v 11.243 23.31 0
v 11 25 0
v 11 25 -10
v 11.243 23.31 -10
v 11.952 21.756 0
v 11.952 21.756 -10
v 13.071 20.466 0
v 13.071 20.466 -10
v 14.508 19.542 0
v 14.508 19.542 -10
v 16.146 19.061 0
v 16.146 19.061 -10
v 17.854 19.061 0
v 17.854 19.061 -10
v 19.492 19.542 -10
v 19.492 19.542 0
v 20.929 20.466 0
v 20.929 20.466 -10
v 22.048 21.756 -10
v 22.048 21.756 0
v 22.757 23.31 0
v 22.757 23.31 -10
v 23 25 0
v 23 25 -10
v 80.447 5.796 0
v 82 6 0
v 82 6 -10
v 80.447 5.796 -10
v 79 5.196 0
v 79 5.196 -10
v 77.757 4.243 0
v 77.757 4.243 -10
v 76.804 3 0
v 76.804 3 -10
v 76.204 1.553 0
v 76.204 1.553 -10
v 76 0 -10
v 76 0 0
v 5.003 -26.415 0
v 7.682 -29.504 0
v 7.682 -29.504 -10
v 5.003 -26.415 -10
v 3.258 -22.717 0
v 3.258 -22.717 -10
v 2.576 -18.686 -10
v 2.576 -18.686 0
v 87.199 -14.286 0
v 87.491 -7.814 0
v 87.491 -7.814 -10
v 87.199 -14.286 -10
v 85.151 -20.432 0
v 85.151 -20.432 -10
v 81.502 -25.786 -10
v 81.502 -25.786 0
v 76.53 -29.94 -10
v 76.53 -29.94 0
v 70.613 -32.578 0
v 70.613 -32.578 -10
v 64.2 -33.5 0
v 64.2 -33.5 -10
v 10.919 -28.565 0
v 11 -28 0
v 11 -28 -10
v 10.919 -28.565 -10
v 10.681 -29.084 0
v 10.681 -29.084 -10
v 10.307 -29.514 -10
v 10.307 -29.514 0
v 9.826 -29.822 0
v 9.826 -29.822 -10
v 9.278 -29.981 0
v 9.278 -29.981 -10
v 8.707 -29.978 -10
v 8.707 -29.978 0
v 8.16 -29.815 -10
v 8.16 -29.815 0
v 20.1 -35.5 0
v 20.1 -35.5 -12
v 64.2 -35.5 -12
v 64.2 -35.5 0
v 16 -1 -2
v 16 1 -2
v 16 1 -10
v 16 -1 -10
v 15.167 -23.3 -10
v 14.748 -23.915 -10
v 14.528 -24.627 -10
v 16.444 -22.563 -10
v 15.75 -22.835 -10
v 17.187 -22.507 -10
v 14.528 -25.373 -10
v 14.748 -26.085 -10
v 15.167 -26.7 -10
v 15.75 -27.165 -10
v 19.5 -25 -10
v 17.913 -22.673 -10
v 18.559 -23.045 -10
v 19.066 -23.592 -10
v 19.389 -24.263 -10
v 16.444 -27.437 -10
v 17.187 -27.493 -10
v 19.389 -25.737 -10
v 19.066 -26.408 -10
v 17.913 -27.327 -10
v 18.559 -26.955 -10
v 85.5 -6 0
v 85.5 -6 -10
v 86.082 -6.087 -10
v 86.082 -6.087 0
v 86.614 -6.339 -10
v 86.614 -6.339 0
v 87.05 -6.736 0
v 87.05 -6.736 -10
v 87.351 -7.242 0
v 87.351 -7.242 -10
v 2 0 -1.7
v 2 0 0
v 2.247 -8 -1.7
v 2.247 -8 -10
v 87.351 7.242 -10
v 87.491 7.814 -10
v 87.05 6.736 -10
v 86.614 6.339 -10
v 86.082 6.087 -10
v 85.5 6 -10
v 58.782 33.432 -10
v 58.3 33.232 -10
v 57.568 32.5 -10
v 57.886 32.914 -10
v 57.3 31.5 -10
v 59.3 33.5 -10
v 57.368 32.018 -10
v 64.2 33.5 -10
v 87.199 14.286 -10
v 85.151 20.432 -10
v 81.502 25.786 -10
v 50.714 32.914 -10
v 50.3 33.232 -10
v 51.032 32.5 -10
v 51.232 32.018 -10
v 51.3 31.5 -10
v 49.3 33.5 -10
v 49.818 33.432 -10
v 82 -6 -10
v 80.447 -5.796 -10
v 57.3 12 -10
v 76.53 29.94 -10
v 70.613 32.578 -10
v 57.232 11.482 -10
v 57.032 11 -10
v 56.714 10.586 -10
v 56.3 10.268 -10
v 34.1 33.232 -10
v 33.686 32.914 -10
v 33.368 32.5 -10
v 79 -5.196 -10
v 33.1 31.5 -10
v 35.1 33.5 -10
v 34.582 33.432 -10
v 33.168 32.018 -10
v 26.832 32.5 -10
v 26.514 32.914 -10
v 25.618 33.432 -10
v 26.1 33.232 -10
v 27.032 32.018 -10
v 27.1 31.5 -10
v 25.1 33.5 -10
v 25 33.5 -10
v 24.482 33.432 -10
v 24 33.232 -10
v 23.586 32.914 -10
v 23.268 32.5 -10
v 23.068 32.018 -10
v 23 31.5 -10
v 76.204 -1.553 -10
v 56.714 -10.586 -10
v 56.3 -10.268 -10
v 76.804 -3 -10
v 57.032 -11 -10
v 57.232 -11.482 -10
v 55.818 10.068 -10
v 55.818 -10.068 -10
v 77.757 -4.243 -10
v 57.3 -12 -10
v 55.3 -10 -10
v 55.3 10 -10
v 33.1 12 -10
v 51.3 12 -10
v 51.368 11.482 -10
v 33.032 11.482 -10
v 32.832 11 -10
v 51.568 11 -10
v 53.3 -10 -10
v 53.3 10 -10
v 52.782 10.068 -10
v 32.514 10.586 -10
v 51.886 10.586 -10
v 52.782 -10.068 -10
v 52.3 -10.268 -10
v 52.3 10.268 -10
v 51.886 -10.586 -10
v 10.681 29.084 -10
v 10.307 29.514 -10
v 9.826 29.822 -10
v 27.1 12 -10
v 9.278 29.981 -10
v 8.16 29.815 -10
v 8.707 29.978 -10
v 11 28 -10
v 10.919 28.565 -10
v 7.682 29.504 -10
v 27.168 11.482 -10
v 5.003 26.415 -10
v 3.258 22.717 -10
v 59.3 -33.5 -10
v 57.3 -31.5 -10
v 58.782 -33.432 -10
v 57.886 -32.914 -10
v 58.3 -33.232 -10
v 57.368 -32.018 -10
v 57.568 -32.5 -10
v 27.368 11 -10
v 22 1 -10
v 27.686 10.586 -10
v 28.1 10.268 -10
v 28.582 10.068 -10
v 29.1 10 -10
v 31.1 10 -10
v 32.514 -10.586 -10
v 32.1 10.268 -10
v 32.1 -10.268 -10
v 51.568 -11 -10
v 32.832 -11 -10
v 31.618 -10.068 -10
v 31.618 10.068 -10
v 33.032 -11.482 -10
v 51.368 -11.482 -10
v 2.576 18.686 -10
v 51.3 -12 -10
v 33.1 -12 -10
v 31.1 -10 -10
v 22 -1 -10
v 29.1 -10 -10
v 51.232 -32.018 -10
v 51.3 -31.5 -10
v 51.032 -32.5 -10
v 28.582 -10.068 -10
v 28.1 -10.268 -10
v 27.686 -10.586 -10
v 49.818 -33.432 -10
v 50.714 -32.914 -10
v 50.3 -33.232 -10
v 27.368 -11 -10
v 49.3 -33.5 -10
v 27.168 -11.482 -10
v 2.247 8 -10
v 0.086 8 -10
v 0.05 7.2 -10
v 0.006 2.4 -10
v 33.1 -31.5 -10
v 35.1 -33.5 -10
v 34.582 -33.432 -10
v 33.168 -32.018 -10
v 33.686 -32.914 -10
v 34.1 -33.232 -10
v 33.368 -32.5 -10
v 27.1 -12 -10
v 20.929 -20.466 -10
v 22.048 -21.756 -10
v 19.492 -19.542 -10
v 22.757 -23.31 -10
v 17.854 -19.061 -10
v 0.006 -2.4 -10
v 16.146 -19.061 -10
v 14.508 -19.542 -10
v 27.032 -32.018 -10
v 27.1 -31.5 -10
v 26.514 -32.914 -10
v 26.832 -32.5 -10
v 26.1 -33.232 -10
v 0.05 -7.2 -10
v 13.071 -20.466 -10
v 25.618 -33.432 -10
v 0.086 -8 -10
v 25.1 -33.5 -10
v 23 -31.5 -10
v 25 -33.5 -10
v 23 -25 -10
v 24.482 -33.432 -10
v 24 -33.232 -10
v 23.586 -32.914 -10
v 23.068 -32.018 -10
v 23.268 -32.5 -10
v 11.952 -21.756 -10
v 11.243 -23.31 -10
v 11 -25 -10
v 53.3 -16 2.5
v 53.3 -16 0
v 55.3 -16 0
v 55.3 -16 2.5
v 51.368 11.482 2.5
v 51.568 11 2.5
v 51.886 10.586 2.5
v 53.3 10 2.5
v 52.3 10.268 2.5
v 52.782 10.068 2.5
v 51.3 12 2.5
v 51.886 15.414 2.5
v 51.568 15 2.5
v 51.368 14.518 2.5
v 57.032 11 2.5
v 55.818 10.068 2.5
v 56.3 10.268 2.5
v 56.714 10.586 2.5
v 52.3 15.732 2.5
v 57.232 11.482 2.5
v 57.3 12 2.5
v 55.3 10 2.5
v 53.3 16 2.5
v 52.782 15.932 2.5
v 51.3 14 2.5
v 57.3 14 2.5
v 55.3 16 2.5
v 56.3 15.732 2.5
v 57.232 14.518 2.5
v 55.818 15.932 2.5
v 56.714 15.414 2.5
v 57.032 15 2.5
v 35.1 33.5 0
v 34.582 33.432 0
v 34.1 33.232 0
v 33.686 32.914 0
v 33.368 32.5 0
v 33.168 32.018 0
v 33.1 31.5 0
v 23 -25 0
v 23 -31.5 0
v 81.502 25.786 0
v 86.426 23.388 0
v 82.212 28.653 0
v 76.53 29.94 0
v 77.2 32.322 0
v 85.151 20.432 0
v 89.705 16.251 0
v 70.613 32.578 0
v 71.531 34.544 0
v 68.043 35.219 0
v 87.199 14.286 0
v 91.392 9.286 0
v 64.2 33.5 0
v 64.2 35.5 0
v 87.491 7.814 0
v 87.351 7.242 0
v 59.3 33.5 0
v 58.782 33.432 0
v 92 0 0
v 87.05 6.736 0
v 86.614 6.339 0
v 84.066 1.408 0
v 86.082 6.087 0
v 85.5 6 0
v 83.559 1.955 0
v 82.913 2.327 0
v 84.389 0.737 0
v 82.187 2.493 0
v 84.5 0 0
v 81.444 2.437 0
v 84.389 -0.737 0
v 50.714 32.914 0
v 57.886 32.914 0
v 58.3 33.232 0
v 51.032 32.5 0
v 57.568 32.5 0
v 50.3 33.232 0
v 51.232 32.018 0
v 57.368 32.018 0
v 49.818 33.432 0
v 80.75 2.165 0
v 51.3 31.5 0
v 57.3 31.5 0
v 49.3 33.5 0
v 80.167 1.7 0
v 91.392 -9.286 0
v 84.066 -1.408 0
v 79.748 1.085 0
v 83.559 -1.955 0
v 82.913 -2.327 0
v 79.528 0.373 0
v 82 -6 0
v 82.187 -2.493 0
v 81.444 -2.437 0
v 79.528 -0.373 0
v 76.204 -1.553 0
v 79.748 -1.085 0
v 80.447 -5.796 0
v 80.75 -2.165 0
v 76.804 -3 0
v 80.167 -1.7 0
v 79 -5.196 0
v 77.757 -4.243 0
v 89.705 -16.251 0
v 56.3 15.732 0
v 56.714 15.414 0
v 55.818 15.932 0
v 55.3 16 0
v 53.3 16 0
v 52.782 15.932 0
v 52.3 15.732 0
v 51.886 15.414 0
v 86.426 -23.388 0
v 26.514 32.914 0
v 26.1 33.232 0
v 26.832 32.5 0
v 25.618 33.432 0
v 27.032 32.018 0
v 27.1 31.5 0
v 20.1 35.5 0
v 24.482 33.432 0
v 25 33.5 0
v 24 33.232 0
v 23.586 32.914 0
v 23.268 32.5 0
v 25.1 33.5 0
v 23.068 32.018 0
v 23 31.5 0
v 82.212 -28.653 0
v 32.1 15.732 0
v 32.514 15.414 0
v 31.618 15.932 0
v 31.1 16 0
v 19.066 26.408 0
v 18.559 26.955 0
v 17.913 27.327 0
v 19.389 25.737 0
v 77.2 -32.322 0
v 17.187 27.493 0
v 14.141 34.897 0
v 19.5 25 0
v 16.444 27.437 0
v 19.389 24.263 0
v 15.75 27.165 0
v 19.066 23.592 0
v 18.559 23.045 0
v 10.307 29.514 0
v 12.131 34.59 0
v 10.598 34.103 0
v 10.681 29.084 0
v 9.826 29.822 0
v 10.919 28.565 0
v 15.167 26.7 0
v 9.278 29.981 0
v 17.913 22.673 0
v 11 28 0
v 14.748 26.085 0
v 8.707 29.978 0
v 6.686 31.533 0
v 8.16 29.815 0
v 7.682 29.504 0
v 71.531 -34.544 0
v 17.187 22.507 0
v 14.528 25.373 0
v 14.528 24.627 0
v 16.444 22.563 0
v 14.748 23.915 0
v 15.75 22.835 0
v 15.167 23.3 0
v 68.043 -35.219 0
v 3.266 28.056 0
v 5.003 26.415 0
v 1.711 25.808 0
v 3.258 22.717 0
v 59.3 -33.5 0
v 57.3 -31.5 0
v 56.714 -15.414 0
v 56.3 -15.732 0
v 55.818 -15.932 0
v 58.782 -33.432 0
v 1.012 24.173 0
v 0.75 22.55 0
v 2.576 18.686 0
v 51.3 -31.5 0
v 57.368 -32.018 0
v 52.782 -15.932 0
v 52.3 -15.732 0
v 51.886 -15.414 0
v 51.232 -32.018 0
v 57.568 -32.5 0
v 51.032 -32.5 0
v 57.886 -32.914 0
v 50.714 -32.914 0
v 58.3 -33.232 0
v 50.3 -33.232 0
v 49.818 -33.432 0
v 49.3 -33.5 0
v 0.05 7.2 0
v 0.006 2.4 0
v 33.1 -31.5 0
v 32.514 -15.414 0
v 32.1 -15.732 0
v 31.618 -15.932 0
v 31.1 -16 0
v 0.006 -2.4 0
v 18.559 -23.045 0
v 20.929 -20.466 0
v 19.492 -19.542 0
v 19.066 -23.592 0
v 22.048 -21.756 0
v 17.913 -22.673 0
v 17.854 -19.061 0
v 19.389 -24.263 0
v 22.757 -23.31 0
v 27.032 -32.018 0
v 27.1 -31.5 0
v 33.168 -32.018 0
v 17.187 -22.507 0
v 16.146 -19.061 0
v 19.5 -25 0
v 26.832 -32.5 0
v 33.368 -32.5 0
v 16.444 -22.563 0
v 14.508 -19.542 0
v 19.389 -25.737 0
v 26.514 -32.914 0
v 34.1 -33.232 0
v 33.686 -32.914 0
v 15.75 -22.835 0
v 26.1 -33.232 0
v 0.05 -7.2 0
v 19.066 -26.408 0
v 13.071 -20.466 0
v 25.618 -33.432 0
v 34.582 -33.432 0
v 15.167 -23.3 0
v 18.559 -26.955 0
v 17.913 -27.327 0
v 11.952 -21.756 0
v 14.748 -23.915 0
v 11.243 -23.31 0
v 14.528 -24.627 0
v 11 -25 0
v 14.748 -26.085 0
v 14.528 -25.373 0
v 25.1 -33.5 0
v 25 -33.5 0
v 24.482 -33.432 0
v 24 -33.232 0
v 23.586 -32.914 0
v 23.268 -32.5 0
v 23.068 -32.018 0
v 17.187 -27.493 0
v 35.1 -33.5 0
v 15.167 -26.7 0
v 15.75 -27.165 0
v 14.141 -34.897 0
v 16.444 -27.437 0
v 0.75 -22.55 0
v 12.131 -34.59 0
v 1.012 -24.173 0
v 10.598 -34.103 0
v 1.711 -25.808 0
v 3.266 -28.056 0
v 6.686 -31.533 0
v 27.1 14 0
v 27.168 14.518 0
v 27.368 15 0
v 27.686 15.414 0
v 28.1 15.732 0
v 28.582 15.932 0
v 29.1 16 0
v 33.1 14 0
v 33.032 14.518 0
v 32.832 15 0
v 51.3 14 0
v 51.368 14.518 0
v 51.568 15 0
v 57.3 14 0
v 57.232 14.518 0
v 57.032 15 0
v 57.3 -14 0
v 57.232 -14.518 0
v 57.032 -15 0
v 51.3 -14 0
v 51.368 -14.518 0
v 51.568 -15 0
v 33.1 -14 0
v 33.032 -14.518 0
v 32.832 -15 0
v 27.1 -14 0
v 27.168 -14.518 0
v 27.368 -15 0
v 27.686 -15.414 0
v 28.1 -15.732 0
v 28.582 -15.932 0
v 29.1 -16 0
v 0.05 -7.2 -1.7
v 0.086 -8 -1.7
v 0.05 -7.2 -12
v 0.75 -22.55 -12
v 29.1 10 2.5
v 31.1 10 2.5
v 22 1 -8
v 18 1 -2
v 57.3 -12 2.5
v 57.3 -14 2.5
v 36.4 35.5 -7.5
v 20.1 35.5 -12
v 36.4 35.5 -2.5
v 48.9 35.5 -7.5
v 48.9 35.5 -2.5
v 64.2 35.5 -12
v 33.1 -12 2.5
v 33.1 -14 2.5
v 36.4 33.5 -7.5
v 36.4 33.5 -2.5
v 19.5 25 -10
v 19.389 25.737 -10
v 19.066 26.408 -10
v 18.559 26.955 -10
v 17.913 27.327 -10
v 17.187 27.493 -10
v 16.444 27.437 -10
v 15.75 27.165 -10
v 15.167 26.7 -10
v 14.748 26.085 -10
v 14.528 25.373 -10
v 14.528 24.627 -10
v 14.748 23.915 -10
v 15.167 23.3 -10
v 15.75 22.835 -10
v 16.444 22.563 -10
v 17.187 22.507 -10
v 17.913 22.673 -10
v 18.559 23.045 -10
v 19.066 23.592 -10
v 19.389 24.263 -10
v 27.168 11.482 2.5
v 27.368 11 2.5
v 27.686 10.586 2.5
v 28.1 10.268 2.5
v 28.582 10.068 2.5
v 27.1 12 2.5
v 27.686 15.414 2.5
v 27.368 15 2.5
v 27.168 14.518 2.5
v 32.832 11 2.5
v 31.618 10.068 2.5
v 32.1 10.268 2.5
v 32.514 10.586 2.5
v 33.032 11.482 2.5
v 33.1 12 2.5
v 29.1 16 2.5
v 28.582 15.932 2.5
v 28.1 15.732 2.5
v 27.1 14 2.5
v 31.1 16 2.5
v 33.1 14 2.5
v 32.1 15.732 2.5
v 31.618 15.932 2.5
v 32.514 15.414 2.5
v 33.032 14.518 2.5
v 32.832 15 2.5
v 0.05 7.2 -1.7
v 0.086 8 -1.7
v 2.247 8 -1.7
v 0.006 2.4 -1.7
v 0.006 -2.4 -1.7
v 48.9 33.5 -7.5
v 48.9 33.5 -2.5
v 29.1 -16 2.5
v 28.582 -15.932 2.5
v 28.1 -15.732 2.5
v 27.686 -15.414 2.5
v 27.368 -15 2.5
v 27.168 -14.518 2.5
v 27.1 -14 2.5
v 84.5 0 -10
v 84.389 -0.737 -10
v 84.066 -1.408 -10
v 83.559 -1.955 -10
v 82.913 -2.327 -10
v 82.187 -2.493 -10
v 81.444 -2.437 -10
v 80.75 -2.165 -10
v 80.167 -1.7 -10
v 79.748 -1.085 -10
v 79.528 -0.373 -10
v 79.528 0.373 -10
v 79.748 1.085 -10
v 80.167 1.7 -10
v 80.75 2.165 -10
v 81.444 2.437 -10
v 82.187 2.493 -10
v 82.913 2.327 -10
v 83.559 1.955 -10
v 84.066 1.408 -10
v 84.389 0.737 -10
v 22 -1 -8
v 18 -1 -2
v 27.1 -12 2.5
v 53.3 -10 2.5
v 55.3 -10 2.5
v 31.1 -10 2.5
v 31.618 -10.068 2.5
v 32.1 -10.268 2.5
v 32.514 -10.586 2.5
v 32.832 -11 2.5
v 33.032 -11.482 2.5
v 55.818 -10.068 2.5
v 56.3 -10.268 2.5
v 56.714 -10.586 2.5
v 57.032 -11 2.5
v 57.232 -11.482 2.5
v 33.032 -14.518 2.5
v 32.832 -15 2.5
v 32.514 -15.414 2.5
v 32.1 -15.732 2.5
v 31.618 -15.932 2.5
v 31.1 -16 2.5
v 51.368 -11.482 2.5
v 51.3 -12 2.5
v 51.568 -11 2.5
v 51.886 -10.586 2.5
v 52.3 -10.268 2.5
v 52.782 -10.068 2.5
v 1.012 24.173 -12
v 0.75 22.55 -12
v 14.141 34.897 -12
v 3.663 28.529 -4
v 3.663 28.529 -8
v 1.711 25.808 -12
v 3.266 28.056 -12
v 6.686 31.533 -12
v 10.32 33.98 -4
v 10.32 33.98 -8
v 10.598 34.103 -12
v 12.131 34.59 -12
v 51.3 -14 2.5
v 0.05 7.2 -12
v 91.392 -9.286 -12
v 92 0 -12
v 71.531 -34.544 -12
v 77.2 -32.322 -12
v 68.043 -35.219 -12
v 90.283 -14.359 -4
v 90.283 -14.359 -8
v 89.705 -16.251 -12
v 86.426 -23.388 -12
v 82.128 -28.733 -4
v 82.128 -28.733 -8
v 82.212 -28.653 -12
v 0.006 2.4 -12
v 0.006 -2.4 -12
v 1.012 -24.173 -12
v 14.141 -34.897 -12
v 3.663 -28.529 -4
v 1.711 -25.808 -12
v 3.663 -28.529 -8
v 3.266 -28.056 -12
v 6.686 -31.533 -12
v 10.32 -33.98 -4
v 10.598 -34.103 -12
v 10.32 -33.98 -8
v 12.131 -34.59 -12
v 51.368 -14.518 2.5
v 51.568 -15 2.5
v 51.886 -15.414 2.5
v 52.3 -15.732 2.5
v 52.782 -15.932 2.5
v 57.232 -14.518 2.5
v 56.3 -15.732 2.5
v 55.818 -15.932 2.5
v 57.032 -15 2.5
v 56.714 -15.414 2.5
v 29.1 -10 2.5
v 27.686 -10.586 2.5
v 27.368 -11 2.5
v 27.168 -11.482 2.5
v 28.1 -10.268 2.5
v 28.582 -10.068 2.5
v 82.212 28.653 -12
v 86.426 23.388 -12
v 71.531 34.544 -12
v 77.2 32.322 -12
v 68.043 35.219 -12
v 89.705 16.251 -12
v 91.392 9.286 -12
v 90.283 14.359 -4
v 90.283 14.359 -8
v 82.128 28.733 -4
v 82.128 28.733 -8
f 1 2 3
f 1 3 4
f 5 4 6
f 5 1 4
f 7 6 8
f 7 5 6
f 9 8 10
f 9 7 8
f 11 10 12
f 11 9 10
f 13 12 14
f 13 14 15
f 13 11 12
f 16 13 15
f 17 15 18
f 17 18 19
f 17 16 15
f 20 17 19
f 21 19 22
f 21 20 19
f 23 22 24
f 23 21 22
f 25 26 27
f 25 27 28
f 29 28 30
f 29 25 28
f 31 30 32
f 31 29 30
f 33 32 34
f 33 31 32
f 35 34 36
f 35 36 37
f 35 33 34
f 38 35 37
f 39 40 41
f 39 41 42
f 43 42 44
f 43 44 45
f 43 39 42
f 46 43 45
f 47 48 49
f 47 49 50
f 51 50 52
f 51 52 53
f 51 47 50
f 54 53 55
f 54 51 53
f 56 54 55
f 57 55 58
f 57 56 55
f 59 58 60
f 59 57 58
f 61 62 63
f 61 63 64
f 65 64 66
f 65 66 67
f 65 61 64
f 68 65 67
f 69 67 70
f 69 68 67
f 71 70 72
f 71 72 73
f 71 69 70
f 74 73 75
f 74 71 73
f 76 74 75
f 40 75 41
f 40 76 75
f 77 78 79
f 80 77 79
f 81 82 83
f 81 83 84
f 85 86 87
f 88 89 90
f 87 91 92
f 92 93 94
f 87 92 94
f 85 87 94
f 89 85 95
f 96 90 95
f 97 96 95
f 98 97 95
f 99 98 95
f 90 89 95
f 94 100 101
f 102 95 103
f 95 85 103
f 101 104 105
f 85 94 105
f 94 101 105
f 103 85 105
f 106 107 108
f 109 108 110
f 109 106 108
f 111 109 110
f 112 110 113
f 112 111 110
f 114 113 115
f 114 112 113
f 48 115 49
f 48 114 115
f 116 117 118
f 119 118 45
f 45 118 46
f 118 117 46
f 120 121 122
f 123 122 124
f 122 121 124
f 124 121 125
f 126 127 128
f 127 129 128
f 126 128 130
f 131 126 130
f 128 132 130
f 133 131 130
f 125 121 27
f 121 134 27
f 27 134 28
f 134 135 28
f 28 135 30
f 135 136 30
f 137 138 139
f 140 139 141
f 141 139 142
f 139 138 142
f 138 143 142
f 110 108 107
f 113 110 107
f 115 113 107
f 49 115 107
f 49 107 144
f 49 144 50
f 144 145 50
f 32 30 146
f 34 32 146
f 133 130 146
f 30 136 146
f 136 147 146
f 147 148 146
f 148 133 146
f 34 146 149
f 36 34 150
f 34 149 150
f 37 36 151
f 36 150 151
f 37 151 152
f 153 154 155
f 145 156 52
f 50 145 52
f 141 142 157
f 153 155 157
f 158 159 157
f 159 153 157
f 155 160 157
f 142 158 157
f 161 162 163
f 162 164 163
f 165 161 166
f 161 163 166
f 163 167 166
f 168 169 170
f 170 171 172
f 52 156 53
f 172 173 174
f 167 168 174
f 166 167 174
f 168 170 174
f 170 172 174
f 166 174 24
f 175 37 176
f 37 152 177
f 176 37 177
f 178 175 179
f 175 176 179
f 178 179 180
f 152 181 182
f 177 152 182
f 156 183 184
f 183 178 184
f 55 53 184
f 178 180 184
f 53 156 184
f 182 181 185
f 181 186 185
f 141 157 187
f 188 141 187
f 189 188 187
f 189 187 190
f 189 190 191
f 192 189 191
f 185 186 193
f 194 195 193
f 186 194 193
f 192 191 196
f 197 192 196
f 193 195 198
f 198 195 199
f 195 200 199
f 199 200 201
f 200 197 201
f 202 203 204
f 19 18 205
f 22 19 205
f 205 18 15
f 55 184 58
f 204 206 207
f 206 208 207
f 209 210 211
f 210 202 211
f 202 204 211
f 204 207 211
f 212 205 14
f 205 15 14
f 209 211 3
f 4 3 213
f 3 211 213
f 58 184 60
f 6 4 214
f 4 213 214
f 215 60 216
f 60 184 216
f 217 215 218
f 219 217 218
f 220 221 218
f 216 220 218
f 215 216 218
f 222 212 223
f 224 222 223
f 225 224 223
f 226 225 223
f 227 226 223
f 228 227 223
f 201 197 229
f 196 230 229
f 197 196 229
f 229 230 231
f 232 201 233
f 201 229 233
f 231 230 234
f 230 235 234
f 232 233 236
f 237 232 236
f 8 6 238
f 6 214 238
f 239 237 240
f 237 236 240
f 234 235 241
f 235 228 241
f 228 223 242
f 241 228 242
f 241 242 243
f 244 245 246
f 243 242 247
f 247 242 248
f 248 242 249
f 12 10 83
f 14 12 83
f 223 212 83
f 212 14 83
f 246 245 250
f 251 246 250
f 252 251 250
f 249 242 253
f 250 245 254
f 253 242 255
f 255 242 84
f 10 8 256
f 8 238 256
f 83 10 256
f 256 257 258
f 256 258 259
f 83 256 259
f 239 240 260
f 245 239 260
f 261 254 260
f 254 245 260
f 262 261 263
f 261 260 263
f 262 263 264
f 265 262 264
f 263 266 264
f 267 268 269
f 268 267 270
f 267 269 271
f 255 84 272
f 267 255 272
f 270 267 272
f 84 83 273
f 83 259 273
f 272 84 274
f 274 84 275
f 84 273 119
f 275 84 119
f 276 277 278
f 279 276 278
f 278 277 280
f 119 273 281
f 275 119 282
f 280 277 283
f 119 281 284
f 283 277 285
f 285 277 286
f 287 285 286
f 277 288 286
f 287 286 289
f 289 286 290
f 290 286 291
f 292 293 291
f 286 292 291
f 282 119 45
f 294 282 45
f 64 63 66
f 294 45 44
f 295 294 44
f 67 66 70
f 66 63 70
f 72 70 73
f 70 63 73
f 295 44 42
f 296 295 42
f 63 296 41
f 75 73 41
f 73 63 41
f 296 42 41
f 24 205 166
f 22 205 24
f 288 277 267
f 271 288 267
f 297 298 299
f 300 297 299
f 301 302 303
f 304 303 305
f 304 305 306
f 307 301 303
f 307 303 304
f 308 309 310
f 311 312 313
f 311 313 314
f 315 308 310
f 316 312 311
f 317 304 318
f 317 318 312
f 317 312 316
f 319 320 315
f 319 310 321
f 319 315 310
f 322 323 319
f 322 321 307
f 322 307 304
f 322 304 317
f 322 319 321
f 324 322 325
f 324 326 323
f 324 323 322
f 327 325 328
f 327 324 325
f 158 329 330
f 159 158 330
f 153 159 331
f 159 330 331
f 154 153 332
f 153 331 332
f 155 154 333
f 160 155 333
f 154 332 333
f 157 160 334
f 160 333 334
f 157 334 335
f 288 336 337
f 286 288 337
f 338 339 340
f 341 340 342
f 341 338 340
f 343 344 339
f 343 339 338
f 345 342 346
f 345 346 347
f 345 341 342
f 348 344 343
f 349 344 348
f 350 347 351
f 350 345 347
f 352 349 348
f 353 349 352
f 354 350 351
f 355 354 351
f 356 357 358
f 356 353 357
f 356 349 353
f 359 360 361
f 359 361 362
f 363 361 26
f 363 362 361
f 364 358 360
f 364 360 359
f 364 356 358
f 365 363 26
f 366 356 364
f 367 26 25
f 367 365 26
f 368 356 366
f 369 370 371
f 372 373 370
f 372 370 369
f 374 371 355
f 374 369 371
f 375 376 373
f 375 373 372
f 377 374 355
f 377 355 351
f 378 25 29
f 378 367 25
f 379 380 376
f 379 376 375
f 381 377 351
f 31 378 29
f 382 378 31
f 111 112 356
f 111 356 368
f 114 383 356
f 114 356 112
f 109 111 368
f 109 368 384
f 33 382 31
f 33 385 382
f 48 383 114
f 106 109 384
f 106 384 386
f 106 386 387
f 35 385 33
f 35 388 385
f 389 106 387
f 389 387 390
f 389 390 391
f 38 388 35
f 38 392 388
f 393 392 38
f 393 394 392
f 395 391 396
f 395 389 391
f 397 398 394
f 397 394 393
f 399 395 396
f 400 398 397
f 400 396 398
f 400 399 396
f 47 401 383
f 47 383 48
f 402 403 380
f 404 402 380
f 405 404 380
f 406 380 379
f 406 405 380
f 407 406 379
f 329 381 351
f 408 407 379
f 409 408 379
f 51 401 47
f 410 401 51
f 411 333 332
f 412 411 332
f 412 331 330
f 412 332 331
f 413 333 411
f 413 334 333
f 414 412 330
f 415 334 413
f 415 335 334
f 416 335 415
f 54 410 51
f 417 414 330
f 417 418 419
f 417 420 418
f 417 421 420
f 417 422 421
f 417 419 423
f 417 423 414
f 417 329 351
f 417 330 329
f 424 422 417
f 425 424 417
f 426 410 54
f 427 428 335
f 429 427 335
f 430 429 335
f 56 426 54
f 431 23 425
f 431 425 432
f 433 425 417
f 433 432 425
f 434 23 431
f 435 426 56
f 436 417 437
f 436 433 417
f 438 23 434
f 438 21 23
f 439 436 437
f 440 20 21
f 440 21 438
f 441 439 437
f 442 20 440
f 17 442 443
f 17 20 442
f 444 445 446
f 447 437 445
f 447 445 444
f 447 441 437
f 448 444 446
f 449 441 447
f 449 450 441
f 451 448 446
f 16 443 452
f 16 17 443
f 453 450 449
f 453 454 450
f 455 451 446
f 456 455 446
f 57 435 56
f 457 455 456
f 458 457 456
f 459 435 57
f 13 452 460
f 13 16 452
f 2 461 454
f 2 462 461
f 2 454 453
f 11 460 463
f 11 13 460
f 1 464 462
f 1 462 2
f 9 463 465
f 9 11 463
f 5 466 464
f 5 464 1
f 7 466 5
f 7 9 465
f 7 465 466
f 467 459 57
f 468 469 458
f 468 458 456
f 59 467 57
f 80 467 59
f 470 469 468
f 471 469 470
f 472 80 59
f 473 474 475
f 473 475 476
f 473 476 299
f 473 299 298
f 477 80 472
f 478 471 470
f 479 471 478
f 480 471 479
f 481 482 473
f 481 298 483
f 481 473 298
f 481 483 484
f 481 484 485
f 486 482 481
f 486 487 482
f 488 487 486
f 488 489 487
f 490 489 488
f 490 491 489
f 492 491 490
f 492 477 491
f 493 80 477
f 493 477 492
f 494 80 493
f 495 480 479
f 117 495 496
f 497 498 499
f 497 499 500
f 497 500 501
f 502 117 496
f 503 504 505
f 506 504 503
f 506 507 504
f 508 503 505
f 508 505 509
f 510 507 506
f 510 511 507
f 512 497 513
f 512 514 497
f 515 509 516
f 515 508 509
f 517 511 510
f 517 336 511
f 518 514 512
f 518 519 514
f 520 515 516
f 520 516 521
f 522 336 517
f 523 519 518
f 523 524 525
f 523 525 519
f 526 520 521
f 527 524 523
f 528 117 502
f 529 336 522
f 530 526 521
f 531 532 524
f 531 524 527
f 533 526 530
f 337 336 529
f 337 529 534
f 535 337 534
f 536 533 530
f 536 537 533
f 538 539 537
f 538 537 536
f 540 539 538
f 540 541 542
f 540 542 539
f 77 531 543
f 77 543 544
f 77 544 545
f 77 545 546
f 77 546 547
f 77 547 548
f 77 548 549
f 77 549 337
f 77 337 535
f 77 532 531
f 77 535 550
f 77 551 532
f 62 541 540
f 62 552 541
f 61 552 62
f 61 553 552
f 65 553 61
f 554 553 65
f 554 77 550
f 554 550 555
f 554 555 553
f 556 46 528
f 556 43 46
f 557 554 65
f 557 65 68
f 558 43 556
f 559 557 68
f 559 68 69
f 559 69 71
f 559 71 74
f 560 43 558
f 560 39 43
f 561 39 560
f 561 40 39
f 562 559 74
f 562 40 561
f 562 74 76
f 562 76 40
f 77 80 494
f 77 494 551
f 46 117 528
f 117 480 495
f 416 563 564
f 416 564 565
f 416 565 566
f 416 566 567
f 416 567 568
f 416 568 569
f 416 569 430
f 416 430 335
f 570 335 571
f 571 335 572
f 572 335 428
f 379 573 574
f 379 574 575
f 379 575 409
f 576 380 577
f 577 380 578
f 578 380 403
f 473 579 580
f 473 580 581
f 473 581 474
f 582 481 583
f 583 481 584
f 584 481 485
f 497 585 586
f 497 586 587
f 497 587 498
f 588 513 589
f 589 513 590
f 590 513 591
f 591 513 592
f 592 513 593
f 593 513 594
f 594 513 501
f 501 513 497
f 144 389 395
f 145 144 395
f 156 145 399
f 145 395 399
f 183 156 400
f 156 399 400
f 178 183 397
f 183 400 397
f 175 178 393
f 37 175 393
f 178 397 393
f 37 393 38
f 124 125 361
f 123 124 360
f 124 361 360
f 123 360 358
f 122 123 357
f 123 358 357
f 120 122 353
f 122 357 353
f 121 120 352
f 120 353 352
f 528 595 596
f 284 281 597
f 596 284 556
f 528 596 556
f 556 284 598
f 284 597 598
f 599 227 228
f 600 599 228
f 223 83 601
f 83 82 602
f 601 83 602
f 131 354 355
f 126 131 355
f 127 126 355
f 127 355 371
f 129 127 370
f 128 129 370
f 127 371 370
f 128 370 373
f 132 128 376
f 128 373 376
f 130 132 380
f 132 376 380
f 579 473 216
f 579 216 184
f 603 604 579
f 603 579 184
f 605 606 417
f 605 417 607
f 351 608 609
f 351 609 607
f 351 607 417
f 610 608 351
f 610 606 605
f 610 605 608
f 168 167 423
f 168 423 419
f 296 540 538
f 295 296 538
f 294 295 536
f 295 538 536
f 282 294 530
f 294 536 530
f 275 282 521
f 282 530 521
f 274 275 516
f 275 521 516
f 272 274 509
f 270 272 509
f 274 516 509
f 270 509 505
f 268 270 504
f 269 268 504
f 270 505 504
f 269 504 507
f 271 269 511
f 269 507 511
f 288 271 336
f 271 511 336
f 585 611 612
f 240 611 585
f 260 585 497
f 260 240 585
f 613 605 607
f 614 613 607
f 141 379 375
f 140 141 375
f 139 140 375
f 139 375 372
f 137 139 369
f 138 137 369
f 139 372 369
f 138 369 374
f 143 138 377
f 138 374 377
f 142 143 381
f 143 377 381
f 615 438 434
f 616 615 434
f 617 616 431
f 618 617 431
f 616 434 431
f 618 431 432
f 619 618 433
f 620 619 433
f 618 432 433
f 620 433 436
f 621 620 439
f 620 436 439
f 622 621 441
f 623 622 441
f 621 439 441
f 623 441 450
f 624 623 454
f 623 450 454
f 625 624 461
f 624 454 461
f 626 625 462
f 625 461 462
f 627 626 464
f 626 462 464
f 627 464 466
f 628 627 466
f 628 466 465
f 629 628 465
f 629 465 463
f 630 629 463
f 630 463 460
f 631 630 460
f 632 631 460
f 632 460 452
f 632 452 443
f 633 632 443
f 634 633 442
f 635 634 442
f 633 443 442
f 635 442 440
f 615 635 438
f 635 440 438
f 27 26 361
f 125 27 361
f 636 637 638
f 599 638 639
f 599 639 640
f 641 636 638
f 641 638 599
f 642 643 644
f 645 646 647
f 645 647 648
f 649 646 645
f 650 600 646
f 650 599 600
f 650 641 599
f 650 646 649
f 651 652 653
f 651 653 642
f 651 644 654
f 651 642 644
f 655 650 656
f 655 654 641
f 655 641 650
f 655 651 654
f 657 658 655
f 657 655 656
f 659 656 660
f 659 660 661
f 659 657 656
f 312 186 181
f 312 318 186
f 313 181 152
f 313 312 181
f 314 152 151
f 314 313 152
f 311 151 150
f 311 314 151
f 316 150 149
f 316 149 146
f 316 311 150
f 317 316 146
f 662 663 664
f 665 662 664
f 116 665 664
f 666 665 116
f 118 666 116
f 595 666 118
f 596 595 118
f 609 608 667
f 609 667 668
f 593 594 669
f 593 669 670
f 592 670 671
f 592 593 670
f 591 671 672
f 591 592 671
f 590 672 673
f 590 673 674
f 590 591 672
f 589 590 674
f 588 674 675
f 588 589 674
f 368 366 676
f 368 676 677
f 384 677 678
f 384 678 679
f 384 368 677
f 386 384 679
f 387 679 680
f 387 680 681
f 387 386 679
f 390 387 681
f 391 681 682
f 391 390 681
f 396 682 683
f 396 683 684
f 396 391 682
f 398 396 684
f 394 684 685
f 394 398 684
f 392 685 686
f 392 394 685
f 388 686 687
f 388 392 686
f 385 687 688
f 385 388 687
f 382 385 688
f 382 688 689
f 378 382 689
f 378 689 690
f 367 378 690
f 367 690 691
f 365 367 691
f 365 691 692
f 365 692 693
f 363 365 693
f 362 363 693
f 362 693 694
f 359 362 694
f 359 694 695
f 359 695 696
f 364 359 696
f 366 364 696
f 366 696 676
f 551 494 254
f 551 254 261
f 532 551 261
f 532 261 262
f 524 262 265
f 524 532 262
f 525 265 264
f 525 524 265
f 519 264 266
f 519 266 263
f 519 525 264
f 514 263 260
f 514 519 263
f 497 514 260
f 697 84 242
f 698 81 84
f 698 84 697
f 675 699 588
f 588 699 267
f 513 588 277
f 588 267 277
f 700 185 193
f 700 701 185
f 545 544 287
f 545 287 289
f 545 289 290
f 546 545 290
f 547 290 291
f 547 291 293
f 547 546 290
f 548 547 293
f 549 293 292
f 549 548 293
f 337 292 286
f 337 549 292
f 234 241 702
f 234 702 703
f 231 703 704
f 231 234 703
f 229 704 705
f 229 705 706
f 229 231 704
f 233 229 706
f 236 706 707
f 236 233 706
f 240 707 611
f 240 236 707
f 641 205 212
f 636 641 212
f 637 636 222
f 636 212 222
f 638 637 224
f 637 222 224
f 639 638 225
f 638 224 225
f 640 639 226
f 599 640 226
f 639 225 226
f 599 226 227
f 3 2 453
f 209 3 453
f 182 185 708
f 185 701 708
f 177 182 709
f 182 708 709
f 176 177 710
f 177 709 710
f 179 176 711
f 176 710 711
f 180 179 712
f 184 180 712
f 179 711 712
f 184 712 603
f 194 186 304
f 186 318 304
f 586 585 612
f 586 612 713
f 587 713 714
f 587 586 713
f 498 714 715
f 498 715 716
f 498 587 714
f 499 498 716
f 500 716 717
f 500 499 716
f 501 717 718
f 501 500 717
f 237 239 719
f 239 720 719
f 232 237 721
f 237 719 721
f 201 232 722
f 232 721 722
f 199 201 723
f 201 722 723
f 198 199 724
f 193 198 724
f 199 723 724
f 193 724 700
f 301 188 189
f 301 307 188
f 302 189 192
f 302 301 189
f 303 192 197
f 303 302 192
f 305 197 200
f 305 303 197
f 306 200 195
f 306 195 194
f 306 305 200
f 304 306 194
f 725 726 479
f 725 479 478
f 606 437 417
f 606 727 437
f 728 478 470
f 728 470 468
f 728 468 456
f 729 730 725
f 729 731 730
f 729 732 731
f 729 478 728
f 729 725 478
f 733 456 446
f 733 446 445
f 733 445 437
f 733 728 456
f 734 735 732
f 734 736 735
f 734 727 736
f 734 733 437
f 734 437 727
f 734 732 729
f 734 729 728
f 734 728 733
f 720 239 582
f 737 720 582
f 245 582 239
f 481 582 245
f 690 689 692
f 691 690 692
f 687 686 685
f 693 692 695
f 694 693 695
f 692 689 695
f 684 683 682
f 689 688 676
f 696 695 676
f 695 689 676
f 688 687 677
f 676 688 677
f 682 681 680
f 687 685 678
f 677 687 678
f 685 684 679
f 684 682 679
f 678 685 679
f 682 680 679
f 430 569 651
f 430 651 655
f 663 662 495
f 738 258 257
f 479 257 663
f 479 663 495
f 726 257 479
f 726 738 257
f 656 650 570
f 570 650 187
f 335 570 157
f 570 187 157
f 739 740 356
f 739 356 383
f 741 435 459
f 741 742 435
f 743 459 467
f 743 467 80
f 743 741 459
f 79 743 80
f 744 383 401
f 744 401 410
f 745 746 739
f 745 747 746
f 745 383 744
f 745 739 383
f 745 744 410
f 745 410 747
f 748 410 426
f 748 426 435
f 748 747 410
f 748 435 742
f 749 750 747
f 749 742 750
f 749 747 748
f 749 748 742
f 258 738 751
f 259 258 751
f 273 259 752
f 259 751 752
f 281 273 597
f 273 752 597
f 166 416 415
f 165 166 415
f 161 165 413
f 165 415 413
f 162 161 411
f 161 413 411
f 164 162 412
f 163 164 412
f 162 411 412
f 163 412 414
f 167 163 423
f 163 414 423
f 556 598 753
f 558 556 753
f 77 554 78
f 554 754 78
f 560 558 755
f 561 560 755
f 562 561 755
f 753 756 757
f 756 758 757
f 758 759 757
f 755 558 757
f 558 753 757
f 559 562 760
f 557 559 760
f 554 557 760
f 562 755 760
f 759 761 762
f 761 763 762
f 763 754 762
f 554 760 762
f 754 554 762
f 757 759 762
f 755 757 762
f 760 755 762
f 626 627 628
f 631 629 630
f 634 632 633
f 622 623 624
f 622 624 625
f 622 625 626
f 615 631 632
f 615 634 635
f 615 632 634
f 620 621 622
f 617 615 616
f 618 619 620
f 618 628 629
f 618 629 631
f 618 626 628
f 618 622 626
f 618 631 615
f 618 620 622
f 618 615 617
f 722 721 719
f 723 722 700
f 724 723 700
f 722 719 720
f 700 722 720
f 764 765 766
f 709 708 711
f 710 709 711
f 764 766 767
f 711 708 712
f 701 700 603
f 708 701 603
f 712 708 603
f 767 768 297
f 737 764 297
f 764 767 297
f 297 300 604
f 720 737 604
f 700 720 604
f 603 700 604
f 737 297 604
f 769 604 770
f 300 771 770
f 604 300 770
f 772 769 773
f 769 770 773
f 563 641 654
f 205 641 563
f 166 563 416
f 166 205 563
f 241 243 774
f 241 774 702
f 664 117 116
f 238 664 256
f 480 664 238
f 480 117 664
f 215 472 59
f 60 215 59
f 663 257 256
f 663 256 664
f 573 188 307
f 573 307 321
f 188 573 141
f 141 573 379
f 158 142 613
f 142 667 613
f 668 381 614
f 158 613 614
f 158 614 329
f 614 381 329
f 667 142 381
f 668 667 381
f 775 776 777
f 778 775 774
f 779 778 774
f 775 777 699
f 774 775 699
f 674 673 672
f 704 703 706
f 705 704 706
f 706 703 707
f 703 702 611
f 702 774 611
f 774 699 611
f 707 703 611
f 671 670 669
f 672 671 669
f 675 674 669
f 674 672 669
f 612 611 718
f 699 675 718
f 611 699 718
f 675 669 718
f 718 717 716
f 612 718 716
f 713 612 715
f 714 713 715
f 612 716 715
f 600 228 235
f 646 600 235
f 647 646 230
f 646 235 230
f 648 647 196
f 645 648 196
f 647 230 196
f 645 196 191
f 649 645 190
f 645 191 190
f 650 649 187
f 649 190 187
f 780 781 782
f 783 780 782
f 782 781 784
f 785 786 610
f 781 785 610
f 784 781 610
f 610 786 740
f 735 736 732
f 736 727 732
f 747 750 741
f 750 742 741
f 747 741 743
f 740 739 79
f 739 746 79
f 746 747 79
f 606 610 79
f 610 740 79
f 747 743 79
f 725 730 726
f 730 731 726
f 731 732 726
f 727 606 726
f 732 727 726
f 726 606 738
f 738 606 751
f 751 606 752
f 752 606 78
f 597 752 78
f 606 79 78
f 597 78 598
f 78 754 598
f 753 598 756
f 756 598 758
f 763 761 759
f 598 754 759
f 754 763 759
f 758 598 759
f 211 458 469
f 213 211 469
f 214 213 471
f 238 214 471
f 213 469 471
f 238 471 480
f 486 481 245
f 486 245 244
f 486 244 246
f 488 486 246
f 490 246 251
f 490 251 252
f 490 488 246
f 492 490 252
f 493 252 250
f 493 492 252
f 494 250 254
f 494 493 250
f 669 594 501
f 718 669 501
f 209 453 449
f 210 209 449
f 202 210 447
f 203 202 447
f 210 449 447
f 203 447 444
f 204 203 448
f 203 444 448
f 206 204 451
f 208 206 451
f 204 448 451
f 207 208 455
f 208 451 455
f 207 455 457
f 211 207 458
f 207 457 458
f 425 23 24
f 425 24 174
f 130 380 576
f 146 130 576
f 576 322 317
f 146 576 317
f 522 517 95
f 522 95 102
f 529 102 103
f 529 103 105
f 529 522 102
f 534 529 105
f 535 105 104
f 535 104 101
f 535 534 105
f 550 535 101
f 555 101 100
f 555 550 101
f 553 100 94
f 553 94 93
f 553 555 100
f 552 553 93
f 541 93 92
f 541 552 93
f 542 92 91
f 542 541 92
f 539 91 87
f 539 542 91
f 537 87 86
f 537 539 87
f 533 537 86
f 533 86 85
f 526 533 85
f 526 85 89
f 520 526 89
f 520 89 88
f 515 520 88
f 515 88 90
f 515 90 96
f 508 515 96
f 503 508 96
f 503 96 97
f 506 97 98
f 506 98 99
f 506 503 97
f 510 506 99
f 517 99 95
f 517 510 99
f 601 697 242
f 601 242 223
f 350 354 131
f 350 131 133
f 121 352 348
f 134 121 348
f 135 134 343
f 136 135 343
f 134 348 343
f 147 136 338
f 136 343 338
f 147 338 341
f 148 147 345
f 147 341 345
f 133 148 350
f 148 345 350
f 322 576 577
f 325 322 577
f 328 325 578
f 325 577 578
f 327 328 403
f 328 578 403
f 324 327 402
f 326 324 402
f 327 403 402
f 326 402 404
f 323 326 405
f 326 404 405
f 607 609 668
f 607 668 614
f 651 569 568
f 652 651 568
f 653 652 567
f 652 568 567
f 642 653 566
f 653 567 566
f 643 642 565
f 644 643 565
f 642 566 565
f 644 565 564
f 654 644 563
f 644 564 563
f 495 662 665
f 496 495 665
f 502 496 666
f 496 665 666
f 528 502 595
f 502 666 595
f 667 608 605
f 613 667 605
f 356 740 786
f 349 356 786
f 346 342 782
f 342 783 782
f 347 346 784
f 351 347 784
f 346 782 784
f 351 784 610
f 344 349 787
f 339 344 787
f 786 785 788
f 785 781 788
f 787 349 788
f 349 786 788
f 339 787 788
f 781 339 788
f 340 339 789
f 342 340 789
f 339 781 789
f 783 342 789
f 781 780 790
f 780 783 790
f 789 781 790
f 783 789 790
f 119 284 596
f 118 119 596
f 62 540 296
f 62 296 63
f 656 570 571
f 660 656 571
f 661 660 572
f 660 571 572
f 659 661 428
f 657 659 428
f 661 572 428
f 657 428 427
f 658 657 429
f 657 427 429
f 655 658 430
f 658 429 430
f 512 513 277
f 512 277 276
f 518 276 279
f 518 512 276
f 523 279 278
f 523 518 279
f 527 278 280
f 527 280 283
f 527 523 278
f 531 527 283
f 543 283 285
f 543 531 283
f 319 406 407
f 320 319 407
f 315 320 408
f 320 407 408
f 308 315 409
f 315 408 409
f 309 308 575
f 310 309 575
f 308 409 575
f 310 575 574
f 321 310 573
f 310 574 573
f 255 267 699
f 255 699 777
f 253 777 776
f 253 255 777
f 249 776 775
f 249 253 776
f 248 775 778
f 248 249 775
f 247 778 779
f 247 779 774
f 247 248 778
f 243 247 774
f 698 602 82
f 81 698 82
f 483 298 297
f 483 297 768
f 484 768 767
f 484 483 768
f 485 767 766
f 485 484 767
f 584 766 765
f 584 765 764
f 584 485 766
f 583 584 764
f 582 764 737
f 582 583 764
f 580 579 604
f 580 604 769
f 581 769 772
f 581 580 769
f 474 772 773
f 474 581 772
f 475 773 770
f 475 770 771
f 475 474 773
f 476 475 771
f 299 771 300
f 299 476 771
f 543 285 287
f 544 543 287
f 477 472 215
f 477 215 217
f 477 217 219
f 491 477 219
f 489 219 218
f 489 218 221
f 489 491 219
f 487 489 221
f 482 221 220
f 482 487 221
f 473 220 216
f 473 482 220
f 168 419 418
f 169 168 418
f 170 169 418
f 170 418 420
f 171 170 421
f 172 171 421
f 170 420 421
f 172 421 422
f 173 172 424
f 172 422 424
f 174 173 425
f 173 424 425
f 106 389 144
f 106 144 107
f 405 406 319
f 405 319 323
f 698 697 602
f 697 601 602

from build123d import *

# Parameters (mm, degrees)
PAD005_DEPTH    = 12
SKETCH025_R     = 2.5
POCKET019_DEPTH = 10
POCKET020_DEPTH = 1
SKETCH027_W     = 8
SKETCH027_H     = 8.3
POCKET021_DEPTH = 5
PAD006_DEPTH    = 2.5
SKETCH029_W     = 12.5
SKETCH029_H     = 5
POCKET022_DEPTH = 2


with BuildPart() as part:
    # Sketch024 → Pad005 (new body)
    with BuildSketch(Plane.XY):
        with BuildLine():
            ThreePointArc((0, 0), (0.0125001507, 3.6000868045), (0.05, 7.2))
            Line((0.05, 7.2), (0.75, 22.55))
            add(Edge.make_bspline(
                [(0.75, 22.55), (0.790433, 24.50555), (2.8995135699, 28.3383927733), (10.6468681476, 35.231617337), (14.5053016695, 34.8194742751), (20.1, 35.5)],
                knots=[0, 0, 0, 0, 0.3333333333, 0.6666666667, 1, 1, 1, 1], degree=3))
            Line((20.1, 35.5), (64.2, 35.5))
            add(Edge.make_bspline(
                [(92, 0), (92.391037, 11.810127), (88.126587, 35.076866), (64.2, 35.5)],
                knots=[0, 0, 0, 0, 1, 1, 1, 1], degree=3))
            Line((92, 0), (0, 0))
        make_face()
    extrude(amount=PAD005_DEPTH)

    # Sketch025 (on Face8 of Pad005) → Pocket019 (cut)
    with BuildSketch(Plane.XY.offset(12)):
        with Locations((17, 25)):
            Circle(SKETCH025_R)
        with BuildLine():
            ThreePointArc((84.5, 0), (82, 2.5), (79.5, 0))
            Line((79.5, 0), (84.5, 0))
        make_face()
        with BuildLine():
            Line((2, 0), (2.5758571429, 18.6857169977))
            ThreePointArc((7.6817324497, 29.5040514173), (4.0036624605, 24.625907301), (2.5758571429, 18.6857169977))
            ThreePointArc((11, 28), (9.8256709089, 29.8216112511), (7.6817324497, 29.5040514173))
            Line((11, 25), (11, 28))
            ThreePointArc((11, 25), (17, 19), (23, 25))
            Line((23, 25), (23, 31.5))
            ThreePointArc((25, 33.5), (23.5857864376, 32.9142135624), (23, 31.5))
            Line((25.1, 33.5), (25, 33.5))
            ThreePointArc((27.1, 31.5), (26.5142135624, 32.9142135624), (25.1, 33.5))
            Line((27.1, 12), (27.1, 31.5))
            ThreePointArc((27.1, 12), (27.6857864376, 10.5857864376), (29.1, 10))
            Line((31.1, 10), (29.1, 10))
            ThreePointArc((31.1, 10), (32.5142135624, 10.5857864376), (33.1, 12))
            Line((33.1, 31.5), (33.1, 12))
            ThreePointArc((35.1, 33.5), (33.6857864376, 32.9142135624), (33.1, 31.5))
            Line((49.3, 33.5), (35.1, 33.5))
            ThreePointArc((51.3, 31.5), (50.7142135624, 32.9142135624), (49.3, 33.5))
            Line((51.3, 12), (51.3, 31.5))
            ThreePointArc((51.3, 12), (51.8857864376, 10.5857864376), (53.3, 10))
            Line((55.3, 10), (53.3, 10))
            ThreePointArc((55.3, 10), (56.7142135624, 10.5857864376), (57.3, 12))
            Line((57.3, 31.4999999999), (57.3, 12))
            ThreePointArc((59.3, 33.4999999999), (57.8857864376, 32.9142135623), (57.3, 31.4999999999))
            Line((59.3, 33.5), (64.2, 33.5))
            ThreePointArc((87.491325765, 7.8139309331), (81.5019467421, 25.7859071373), (64.2, 33.5))
            ThreePointArc((85.5, 6), (86.8468225322, 6.521463877), (87.491325765, 7.8139309331))
            Line((82, 6), (85.5, 6))
            ThreePointArc((82, 6), (77.7573593129, 4.2426406871), (76, 0))
            Line((22, 0), (76, 0))
            Line((22, 1), (22, 0))
            Line((16, 1), (22, 1))
            Line((16, 0), (16, 1))
            Line((2, 0), (16, 0))
        make_face()
    extrude(amount=-POCKET019_DEPTH, mode=Mode.SUBTRACT)

    # Sketch026 (on Face3 of Pocket019) → Pocket020 (cut)
    with BuildSketch(Plane.XZ):
        Polygon((22, 12), (22, 4), (18, 10), (16, 10), (16, 12), align=None)
    extrude(amount=-POCKET020_DEPTH, mode=Mode.SUBTRACT)

    # Sketch027 → Pocket021 (cut)
    with BuildSketch(Plane.YZ):
        with Locations((4, 6.15)):
            Rectangle(SKETCH027_W, SKETCH027_H)
    extrude(amount=POCKET021_DEPTH, mode=Mode.SUBTRACT)

    # Sketch028 (on Face8 of Pocket021) → Pad006 (join)
    with BuildSketch(Plane.XY.offset(12)):
        with BuildLine():
            ThreePointArc((31.1, 10), (32.5142135624, 10.5857864376), (33.1, 12))
            Line((33.1, 12), (33.1, 14))
            ThreePointArc((33.1, 14), (32.5142135624, 15.4142135624), (31.1, 16))
            Line((29.1, 16), (31.1, 16))
            ThreePointArc((29.1, 16), (27.6857864376, 15.4142135624), (27.1, 14))
            Line((27.1, 12), (27.1, 14))
            ThreePointArc((27.1, 12), (27.6857864376, 10.5857864376), (29.1, 10))
            Line((29.1, 10), (31.1, 10))
        make_face()
        with BuildLine():
            ThreePointArc((51.3, 12), (51.8857864376, 10.5857864376), (53.3, 10))
            Line((53.3, 10), (55.3, 10))
            ThreePointArc((55.3, 10), (56.7142135624, 10.5857864376), (57.3, 12))
            Line((57.3, 12), (57.3, 14))
            ThreePointArc((57.3, 14), (56.7142135624, 15.4142135624), (55.3, 16))
            Line((53.3, 16), (55.3, 16))
            ThreePointArc((53.3, 16), (51.8857864376, 15.4142135624), (51.3, 14))
            Line((51.3, 12), (51.3, 14))
        make_face()
    extrude(amount=PAD006_DEPTH)

    # Mirrored002: part across XZ


with BuildPart() as part_1:
    add(part.part)
    add(part.part.mirror(Plane.XZ))

    # Sketch029 (on Face33 of Mirrored002) → Pocket022 (cut)
    with BuildSketch(Plane(origin=(0, 35.5, 0), x_dir=(-1, 0, 0), z_dir=(0, 1, 0))):
        with Locations((-42.65, 7)):
            Rectangle(SKETCH029_W, SKETCH029_H)
    extrude(amount=-POCKET022_DEPTH, mode=Mode.SUBTRACT)


with BuildPart() as part_2:
    # Body004 placement: moved
    add(part_1.part.moved(Location((0, 0, -12))))


solid = part_2.part
